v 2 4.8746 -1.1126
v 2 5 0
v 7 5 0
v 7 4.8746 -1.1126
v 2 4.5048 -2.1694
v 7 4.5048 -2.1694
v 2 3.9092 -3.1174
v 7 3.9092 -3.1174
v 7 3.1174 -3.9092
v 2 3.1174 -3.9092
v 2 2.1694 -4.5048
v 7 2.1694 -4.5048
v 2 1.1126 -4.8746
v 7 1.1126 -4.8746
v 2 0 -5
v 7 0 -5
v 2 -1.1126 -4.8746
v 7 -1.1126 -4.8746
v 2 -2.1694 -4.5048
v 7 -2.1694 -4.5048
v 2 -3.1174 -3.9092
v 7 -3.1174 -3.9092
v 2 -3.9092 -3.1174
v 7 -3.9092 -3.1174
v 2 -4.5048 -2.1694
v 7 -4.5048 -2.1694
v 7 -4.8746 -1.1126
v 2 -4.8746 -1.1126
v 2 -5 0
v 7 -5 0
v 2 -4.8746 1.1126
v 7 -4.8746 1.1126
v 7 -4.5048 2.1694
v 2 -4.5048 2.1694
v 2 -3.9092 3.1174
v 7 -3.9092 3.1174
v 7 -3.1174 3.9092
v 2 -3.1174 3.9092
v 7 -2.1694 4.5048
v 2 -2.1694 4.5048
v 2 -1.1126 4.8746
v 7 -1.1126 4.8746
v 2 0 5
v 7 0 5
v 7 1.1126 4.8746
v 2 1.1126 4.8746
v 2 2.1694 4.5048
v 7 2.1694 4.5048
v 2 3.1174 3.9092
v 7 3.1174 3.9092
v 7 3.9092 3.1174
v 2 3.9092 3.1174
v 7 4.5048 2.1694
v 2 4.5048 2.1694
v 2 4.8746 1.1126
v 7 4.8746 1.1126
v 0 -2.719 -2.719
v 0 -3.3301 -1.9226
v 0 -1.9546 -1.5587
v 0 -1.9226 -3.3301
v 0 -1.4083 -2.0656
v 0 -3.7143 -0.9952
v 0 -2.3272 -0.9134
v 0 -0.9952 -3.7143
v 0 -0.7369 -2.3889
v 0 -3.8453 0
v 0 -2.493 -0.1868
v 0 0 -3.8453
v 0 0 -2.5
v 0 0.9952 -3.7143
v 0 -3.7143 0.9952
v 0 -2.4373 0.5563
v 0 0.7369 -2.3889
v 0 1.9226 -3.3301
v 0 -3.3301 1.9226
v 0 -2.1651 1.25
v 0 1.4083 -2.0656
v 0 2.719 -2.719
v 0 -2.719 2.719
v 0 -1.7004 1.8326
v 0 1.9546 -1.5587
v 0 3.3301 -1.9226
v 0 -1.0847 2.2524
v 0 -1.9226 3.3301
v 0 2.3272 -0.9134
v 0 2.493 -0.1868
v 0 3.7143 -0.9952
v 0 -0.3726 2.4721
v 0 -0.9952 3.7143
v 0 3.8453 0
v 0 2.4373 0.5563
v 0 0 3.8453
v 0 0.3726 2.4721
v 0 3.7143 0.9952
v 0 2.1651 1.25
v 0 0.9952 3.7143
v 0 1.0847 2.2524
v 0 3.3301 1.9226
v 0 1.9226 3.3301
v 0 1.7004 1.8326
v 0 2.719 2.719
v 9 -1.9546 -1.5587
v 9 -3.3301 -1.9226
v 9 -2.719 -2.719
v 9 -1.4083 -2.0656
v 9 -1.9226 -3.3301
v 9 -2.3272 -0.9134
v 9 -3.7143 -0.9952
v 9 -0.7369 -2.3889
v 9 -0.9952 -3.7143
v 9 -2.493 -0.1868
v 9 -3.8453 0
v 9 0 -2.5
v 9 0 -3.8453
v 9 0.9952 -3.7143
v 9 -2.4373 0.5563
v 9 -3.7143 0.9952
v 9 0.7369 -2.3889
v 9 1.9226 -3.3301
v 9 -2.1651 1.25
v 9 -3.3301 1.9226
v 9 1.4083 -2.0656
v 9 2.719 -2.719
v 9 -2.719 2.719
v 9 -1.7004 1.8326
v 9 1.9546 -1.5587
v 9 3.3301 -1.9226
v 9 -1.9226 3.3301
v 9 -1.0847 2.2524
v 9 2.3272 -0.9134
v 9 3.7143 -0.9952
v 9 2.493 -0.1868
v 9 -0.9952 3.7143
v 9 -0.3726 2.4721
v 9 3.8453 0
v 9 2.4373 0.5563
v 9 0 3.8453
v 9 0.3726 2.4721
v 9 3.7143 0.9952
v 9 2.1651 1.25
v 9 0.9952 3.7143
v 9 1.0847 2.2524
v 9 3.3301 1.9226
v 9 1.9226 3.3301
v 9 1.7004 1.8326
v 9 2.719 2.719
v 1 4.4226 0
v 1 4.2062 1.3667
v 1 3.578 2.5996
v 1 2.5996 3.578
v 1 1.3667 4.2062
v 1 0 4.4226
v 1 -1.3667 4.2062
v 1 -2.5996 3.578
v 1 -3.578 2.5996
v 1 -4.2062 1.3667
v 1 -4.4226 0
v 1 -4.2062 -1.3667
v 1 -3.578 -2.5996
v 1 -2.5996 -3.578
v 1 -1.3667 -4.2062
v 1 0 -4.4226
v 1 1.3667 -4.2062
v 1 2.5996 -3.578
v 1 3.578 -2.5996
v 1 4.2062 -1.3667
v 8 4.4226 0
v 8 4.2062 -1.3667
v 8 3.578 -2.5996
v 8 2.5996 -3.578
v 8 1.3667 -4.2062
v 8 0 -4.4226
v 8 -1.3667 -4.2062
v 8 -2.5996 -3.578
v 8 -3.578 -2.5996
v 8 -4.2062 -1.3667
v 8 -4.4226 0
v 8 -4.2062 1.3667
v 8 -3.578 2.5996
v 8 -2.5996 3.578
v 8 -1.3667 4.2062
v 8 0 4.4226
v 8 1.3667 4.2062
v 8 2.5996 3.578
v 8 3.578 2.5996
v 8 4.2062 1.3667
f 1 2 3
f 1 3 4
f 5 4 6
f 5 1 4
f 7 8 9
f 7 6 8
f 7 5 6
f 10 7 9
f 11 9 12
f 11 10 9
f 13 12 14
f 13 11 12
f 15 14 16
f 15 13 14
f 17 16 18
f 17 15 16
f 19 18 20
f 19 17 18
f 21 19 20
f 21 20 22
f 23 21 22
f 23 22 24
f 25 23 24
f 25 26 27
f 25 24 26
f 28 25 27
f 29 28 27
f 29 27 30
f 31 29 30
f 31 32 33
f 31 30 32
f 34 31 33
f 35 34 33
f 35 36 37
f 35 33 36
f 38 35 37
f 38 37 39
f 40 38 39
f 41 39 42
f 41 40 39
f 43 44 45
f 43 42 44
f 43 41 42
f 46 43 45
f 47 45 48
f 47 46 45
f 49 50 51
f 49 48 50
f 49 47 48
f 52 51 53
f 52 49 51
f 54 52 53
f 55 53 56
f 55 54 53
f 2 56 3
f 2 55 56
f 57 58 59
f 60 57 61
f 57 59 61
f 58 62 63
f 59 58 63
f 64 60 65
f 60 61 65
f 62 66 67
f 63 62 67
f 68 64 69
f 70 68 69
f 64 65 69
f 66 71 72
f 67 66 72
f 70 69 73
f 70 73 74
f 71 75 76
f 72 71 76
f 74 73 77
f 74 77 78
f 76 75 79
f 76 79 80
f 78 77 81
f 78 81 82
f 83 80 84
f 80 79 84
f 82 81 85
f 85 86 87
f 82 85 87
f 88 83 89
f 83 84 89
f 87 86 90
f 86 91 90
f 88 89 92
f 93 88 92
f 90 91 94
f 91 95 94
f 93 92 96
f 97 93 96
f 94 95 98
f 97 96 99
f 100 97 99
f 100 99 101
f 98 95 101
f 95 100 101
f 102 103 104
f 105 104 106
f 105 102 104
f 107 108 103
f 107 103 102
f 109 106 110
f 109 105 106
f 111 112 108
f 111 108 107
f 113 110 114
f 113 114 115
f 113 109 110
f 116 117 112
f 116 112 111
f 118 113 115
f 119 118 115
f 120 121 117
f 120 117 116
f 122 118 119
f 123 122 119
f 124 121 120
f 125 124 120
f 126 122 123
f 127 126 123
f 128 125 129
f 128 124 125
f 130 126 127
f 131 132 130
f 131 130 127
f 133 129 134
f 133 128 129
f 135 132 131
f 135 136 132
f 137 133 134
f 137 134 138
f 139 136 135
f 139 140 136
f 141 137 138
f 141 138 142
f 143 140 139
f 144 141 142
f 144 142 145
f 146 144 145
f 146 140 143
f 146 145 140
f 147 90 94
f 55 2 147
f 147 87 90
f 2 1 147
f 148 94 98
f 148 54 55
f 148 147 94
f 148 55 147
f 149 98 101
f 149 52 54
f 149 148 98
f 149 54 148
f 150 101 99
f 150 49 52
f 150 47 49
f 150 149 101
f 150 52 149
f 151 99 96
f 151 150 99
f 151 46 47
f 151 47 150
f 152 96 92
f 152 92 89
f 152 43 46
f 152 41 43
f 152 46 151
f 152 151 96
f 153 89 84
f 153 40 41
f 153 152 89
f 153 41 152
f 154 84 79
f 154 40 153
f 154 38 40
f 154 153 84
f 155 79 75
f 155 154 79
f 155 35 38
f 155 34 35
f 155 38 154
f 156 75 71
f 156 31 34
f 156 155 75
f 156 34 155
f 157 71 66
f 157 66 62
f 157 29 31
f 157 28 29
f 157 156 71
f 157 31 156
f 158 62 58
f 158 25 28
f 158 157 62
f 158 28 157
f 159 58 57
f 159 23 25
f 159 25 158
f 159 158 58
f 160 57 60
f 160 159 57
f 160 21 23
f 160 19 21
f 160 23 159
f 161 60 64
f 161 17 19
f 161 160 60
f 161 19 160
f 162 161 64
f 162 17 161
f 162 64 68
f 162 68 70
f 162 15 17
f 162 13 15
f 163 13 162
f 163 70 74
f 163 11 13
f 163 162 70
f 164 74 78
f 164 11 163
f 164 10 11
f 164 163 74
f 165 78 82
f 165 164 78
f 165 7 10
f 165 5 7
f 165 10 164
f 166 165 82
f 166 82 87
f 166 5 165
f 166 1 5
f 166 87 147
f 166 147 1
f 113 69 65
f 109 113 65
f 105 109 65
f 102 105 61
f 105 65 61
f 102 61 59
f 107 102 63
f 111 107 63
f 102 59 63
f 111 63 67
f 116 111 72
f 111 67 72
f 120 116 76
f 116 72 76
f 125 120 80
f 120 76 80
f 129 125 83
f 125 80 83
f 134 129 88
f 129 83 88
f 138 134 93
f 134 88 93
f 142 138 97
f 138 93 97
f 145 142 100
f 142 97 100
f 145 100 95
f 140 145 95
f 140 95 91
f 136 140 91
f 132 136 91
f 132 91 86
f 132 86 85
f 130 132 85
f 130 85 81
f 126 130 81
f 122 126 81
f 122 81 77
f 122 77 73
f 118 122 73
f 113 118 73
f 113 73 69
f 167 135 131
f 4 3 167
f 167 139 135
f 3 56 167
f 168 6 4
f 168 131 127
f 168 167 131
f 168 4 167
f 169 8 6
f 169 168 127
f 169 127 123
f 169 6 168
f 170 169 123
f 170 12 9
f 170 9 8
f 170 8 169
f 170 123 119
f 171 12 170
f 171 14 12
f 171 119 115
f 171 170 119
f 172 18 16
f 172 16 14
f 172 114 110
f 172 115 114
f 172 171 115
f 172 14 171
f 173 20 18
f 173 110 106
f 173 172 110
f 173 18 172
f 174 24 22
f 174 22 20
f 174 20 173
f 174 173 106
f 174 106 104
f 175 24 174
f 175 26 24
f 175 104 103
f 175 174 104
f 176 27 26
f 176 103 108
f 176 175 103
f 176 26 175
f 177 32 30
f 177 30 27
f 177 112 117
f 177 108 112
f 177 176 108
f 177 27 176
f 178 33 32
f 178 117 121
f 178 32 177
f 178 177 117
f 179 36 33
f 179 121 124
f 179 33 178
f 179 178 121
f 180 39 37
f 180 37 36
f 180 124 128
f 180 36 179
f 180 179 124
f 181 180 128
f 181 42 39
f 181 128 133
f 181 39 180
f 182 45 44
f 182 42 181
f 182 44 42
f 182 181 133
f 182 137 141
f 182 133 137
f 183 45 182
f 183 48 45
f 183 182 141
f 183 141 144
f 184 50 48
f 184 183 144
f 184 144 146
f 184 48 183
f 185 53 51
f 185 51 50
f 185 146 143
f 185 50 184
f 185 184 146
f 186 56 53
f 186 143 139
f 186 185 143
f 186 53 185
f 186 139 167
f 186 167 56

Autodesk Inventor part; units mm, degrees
ref_plane "YZ Plane" through (0, 0, 0) normal (1, 0, 0) x (0, 1, 0)
ref_plane "XZ Plane" through (0, 0, 0) normal (0, 1, 0) x (-1, 0, 0)
ref_plane "XY Plane" through (0, 0, 0) normal (0, 0, 1) x (1, 0, 0)
sketch "Boceto1" plane through (0, 0, 0) normal (0, 0, 1) x (1, 0, 0)
  line L0 (0, 0) -> (9, 0)
  line L1 (9, 0) -> (9, 5)
  line L2 (9, 5) -> (0, 5)
  line L3 (0, 5) -> (0, 0)
  line L4 (-11.6146, 0) -> (11.6146, 0)
  line L5 (0, 0) -> (0, 2.5)
  line L6 (0, 2.5) -> (2.5247, -1.873)
  dimension "d0" = 9
  dimension "d1" = 5
  dimension "d3" = 2.5
  dimension "d4" = 5
  dimension "d5" = 30
revolve "Revolución1" add sketch "Boceto1" angle 360 about axis through (-11.6146, 0, 0) along (1, 0, 0)
chamfer "Chaflán1" distance 2 angle 30 2 edges at (0, -5, 0) (9, -5, 0) measured on face at (6, 4.9838, -0.4023)
sketch "Boceto2" plane through (9, 0, 0) normal (1, 0, 0) x (0, 0, -1)
  circle A0 centre (0, 0) radius 5 projected
  point P0 (0, 0)
hole "Agujero1" at (9, 0, 0) direction (-1, 0, 0) diameter 5 end through all
properties part number "hudson1-37"
